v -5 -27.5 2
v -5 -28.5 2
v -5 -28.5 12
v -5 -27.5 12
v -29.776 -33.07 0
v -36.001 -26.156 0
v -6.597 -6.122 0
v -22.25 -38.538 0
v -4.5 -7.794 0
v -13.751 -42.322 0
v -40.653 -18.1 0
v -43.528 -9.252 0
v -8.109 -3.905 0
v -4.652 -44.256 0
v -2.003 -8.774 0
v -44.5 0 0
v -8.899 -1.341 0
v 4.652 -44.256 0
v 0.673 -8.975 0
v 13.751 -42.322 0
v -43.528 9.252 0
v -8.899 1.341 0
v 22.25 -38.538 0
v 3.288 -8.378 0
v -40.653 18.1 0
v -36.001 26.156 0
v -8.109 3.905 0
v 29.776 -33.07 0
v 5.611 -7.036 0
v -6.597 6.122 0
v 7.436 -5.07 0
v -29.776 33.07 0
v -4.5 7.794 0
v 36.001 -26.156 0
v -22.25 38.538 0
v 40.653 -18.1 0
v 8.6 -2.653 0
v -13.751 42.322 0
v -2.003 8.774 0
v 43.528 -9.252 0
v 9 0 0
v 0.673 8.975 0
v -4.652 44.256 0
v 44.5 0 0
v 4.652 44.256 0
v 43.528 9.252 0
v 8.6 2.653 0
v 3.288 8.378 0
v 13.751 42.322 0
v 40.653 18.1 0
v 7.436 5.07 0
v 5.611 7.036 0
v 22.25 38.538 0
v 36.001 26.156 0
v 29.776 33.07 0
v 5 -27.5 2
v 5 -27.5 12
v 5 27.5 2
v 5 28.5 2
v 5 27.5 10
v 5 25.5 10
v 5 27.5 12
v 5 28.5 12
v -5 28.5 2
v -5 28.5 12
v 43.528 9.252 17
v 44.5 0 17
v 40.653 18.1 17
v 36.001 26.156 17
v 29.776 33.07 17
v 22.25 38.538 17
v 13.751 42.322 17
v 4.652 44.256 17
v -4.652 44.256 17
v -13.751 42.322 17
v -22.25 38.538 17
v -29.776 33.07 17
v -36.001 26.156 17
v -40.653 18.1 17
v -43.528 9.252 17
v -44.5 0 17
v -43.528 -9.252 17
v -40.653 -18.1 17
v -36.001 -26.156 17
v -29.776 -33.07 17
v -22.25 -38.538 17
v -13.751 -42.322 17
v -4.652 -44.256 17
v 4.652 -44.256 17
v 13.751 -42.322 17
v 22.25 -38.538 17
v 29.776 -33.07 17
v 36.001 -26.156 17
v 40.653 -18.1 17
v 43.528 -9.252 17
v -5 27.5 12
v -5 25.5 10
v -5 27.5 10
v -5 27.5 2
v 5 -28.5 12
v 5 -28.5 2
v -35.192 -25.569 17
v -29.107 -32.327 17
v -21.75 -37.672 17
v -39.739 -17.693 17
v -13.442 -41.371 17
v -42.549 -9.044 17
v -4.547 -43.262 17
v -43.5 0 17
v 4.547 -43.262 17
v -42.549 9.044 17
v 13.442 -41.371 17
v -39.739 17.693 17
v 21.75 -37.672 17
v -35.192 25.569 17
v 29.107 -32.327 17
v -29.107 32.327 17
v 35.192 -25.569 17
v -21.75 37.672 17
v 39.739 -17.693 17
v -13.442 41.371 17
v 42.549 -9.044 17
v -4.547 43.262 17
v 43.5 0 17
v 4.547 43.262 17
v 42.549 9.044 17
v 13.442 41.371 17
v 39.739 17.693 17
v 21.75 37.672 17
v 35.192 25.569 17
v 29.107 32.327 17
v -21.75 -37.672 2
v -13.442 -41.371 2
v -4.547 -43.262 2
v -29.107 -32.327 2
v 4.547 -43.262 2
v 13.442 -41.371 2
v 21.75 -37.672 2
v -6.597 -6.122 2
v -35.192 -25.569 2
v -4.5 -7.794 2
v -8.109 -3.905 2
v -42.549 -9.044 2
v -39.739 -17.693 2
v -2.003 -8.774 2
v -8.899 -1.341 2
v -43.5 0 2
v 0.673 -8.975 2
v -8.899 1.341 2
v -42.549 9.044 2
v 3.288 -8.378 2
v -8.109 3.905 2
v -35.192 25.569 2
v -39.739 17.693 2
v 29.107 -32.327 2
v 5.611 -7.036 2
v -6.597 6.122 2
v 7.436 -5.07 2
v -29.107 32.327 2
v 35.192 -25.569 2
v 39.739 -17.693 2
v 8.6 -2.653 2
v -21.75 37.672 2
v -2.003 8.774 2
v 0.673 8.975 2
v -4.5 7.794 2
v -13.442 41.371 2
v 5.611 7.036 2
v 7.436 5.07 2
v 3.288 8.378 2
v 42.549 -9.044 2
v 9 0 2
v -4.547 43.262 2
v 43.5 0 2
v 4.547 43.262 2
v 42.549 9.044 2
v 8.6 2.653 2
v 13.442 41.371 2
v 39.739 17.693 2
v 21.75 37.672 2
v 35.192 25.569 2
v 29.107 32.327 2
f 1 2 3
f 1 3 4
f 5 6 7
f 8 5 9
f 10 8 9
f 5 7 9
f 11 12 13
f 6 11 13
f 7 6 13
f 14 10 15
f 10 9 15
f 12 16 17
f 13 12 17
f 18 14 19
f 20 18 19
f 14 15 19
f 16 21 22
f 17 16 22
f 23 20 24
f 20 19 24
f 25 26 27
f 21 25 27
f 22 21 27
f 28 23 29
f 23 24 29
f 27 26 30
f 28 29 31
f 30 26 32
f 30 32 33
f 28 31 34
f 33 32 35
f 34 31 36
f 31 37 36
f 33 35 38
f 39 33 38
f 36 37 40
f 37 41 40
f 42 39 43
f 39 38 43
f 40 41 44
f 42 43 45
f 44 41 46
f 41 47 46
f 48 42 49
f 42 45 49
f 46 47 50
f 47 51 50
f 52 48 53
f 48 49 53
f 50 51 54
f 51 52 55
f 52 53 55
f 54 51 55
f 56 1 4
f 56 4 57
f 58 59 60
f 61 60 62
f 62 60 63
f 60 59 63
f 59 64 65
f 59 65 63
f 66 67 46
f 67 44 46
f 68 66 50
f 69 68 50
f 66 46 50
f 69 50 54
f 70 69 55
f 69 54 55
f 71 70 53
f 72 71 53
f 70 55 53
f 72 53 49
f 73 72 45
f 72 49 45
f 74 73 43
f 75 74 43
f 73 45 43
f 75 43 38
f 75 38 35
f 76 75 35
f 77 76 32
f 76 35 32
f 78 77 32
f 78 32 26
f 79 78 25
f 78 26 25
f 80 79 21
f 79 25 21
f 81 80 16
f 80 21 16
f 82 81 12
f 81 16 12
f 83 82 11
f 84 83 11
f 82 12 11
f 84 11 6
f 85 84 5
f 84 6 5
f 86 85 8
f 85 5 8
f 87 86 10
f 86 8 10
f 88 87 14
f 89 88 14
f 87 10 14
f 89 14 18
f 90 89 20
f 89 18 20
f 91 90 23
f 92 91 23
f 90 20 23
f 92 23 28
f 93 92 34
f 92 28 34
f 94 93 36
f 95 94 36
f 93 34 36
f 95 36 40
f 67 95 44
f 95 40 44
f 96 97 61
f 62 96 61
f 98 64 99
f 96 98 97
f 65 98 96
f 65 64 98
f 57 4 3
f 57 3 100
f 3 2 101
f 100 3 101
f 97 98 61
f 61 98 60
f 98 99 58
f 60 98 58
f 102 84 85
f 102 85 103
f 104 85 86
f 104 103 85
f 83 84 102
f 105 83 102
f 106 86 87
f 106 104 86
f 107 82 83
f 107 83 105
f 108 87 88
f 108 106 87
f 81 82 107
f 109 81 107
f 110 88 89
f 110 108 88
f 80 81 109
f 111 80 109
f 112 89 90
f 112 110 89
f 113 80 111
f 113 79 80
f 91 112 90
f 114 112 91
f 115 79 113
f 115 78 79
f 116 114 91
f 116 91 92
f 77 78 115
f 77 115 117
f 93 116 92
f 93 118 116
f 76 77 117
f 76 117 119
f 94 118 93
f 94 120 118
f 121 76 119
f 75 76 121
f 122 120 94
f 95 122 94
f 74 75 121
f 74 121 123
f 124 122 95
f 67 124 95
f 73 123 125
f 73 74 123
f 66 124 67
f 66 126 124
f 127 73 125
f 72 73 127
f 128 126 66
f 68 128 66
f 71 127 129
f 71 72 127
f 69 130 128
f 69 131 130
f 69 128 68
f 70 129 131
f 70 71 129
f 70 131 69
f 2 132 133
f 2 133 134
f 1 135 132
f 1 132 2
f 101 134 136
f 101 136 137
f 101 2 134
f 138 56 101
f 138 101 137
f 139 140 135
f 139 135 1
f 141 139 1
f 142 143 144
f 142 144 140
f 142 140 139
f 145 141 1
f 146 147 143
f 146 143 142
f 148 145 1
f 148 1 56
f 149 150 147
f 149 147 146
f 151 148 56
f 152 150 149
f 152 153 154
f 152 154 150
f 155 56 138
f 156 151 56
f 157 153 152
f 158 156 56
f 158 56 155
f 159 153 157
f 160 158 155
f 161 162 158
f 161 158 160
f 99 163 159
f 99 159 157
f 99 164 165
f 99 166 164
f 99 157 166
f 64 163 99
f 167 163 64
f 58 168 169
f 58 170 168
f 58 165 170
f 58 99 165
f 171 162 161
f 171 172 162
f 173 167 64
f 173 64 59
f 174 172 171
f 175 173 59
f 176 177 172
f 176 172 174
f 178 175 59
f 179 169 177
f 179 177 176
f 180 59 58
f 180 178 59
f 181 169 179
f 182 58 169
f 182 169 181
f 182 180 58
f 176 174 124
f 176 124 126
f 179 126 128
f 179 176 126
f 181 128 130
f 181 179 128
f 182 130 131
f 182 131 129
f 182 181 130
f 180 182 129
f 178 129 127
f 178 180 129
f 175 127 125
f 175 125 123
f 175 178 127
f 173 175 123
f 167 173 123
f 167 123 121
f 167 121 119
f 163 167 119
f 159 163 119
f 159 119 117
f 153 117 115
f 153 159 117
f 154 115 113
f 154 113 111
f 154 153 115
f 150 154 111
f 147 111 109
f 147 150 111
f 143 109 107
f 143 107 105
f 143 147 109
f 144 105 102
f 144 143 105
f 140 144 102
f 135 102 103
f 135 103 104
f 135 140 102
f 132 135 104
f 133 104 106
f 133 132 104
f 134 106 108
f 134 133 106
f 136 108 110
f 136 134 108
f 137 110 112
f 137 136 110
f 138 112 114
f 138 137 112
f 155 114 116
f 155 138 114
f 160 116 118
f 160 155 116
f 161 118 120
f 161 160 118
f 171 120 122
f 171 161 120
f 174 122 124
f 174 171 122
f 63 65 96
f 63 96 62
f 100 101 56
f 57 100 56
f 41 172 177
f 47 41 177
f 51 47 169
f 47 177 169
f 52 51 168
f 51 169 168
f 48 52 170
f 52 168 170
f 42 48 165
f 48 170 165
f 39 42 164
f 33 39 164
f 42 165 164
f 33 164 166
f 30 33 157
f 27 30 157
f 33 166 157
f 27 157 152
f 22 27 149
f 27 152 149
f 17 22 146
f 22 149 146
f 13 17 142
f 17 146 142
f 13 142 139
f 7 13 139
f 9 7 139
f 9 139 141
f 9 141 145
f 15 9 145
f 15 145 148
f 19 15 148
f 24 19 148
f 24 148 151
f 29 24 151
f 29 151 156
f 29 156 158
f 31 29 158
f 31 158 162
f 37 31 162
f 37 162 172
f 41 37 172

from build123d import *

# Parameters (mm, degrees)
F0_R      = 44.5
F1_DEPTH  = 2
F2_R      = 44.5
F2_R_2    = 43.5
F3_DEPTH  = 15
F4_R      = 9
F5_DEPTH  = 25
F7_W      = 10
F7_H      = 1
F8_DEPTH  = 10
F10_W     = 10
F10_H     = 2
F11_DEPTH = 2
F12_SIZE  = 1.99999


# Not quite as in the source:
# - a fillet or chamfer is up to 0.001 mm smaller than in the source, because OpenCascade refuses the exact size


with BuildPart() as f1:
    # F0 (on Top) → F1 (new body)
    with BuildSketch(Plane.XY):
        Circle(F0_R)
    extrude(amount=F1_DEPTH)

    # F2 (on face) → F3 (join)
    with BuildSketch(Plane.XY.offset(2)):
        Circle(F2_R)
        Circle(F2_R_2, mode=Mode.SUBTRACT)
    extrude(amount=F3_DEPTH)

    # F4 (on face) → F5 (cut)
    with BuildSketch(Plane.XY.offset(2)):
        Circle(F4_R)
    extrude(amount=-F5_DEPTH, mode=Mode.SUBTRACT)

    # F7 (on face) → F8 (join)
    with BuildSketch(Plane.XY.offset(2)):
        with Locations((0, 28)):
            Rectangle(F7_W, F7_H)
        with Locations((0, -28)):
            Rectangle(F7_W, F7_H)
    extrude(amount=F8_DEPTH)

    # F10 (on face) → F11 (join)
    with BuildSketch(Plane.XZ.offset(-27.5)):
        with Locations((0, 11)):
            Rectangle(F10_W, F10_H)
    extrude(amount=F11_DEPTH)

    # F12 (size 2 in the source; OpenCascade refuses exactly that, so slightly less here)
    f12_edges = [f1.edges().sort_by_distance(p)[0] for p in [
        (0, 25.5, 12),
    ]]
    chamfer(f12_edges, length=F12_SIZE)


solid = f1.part
